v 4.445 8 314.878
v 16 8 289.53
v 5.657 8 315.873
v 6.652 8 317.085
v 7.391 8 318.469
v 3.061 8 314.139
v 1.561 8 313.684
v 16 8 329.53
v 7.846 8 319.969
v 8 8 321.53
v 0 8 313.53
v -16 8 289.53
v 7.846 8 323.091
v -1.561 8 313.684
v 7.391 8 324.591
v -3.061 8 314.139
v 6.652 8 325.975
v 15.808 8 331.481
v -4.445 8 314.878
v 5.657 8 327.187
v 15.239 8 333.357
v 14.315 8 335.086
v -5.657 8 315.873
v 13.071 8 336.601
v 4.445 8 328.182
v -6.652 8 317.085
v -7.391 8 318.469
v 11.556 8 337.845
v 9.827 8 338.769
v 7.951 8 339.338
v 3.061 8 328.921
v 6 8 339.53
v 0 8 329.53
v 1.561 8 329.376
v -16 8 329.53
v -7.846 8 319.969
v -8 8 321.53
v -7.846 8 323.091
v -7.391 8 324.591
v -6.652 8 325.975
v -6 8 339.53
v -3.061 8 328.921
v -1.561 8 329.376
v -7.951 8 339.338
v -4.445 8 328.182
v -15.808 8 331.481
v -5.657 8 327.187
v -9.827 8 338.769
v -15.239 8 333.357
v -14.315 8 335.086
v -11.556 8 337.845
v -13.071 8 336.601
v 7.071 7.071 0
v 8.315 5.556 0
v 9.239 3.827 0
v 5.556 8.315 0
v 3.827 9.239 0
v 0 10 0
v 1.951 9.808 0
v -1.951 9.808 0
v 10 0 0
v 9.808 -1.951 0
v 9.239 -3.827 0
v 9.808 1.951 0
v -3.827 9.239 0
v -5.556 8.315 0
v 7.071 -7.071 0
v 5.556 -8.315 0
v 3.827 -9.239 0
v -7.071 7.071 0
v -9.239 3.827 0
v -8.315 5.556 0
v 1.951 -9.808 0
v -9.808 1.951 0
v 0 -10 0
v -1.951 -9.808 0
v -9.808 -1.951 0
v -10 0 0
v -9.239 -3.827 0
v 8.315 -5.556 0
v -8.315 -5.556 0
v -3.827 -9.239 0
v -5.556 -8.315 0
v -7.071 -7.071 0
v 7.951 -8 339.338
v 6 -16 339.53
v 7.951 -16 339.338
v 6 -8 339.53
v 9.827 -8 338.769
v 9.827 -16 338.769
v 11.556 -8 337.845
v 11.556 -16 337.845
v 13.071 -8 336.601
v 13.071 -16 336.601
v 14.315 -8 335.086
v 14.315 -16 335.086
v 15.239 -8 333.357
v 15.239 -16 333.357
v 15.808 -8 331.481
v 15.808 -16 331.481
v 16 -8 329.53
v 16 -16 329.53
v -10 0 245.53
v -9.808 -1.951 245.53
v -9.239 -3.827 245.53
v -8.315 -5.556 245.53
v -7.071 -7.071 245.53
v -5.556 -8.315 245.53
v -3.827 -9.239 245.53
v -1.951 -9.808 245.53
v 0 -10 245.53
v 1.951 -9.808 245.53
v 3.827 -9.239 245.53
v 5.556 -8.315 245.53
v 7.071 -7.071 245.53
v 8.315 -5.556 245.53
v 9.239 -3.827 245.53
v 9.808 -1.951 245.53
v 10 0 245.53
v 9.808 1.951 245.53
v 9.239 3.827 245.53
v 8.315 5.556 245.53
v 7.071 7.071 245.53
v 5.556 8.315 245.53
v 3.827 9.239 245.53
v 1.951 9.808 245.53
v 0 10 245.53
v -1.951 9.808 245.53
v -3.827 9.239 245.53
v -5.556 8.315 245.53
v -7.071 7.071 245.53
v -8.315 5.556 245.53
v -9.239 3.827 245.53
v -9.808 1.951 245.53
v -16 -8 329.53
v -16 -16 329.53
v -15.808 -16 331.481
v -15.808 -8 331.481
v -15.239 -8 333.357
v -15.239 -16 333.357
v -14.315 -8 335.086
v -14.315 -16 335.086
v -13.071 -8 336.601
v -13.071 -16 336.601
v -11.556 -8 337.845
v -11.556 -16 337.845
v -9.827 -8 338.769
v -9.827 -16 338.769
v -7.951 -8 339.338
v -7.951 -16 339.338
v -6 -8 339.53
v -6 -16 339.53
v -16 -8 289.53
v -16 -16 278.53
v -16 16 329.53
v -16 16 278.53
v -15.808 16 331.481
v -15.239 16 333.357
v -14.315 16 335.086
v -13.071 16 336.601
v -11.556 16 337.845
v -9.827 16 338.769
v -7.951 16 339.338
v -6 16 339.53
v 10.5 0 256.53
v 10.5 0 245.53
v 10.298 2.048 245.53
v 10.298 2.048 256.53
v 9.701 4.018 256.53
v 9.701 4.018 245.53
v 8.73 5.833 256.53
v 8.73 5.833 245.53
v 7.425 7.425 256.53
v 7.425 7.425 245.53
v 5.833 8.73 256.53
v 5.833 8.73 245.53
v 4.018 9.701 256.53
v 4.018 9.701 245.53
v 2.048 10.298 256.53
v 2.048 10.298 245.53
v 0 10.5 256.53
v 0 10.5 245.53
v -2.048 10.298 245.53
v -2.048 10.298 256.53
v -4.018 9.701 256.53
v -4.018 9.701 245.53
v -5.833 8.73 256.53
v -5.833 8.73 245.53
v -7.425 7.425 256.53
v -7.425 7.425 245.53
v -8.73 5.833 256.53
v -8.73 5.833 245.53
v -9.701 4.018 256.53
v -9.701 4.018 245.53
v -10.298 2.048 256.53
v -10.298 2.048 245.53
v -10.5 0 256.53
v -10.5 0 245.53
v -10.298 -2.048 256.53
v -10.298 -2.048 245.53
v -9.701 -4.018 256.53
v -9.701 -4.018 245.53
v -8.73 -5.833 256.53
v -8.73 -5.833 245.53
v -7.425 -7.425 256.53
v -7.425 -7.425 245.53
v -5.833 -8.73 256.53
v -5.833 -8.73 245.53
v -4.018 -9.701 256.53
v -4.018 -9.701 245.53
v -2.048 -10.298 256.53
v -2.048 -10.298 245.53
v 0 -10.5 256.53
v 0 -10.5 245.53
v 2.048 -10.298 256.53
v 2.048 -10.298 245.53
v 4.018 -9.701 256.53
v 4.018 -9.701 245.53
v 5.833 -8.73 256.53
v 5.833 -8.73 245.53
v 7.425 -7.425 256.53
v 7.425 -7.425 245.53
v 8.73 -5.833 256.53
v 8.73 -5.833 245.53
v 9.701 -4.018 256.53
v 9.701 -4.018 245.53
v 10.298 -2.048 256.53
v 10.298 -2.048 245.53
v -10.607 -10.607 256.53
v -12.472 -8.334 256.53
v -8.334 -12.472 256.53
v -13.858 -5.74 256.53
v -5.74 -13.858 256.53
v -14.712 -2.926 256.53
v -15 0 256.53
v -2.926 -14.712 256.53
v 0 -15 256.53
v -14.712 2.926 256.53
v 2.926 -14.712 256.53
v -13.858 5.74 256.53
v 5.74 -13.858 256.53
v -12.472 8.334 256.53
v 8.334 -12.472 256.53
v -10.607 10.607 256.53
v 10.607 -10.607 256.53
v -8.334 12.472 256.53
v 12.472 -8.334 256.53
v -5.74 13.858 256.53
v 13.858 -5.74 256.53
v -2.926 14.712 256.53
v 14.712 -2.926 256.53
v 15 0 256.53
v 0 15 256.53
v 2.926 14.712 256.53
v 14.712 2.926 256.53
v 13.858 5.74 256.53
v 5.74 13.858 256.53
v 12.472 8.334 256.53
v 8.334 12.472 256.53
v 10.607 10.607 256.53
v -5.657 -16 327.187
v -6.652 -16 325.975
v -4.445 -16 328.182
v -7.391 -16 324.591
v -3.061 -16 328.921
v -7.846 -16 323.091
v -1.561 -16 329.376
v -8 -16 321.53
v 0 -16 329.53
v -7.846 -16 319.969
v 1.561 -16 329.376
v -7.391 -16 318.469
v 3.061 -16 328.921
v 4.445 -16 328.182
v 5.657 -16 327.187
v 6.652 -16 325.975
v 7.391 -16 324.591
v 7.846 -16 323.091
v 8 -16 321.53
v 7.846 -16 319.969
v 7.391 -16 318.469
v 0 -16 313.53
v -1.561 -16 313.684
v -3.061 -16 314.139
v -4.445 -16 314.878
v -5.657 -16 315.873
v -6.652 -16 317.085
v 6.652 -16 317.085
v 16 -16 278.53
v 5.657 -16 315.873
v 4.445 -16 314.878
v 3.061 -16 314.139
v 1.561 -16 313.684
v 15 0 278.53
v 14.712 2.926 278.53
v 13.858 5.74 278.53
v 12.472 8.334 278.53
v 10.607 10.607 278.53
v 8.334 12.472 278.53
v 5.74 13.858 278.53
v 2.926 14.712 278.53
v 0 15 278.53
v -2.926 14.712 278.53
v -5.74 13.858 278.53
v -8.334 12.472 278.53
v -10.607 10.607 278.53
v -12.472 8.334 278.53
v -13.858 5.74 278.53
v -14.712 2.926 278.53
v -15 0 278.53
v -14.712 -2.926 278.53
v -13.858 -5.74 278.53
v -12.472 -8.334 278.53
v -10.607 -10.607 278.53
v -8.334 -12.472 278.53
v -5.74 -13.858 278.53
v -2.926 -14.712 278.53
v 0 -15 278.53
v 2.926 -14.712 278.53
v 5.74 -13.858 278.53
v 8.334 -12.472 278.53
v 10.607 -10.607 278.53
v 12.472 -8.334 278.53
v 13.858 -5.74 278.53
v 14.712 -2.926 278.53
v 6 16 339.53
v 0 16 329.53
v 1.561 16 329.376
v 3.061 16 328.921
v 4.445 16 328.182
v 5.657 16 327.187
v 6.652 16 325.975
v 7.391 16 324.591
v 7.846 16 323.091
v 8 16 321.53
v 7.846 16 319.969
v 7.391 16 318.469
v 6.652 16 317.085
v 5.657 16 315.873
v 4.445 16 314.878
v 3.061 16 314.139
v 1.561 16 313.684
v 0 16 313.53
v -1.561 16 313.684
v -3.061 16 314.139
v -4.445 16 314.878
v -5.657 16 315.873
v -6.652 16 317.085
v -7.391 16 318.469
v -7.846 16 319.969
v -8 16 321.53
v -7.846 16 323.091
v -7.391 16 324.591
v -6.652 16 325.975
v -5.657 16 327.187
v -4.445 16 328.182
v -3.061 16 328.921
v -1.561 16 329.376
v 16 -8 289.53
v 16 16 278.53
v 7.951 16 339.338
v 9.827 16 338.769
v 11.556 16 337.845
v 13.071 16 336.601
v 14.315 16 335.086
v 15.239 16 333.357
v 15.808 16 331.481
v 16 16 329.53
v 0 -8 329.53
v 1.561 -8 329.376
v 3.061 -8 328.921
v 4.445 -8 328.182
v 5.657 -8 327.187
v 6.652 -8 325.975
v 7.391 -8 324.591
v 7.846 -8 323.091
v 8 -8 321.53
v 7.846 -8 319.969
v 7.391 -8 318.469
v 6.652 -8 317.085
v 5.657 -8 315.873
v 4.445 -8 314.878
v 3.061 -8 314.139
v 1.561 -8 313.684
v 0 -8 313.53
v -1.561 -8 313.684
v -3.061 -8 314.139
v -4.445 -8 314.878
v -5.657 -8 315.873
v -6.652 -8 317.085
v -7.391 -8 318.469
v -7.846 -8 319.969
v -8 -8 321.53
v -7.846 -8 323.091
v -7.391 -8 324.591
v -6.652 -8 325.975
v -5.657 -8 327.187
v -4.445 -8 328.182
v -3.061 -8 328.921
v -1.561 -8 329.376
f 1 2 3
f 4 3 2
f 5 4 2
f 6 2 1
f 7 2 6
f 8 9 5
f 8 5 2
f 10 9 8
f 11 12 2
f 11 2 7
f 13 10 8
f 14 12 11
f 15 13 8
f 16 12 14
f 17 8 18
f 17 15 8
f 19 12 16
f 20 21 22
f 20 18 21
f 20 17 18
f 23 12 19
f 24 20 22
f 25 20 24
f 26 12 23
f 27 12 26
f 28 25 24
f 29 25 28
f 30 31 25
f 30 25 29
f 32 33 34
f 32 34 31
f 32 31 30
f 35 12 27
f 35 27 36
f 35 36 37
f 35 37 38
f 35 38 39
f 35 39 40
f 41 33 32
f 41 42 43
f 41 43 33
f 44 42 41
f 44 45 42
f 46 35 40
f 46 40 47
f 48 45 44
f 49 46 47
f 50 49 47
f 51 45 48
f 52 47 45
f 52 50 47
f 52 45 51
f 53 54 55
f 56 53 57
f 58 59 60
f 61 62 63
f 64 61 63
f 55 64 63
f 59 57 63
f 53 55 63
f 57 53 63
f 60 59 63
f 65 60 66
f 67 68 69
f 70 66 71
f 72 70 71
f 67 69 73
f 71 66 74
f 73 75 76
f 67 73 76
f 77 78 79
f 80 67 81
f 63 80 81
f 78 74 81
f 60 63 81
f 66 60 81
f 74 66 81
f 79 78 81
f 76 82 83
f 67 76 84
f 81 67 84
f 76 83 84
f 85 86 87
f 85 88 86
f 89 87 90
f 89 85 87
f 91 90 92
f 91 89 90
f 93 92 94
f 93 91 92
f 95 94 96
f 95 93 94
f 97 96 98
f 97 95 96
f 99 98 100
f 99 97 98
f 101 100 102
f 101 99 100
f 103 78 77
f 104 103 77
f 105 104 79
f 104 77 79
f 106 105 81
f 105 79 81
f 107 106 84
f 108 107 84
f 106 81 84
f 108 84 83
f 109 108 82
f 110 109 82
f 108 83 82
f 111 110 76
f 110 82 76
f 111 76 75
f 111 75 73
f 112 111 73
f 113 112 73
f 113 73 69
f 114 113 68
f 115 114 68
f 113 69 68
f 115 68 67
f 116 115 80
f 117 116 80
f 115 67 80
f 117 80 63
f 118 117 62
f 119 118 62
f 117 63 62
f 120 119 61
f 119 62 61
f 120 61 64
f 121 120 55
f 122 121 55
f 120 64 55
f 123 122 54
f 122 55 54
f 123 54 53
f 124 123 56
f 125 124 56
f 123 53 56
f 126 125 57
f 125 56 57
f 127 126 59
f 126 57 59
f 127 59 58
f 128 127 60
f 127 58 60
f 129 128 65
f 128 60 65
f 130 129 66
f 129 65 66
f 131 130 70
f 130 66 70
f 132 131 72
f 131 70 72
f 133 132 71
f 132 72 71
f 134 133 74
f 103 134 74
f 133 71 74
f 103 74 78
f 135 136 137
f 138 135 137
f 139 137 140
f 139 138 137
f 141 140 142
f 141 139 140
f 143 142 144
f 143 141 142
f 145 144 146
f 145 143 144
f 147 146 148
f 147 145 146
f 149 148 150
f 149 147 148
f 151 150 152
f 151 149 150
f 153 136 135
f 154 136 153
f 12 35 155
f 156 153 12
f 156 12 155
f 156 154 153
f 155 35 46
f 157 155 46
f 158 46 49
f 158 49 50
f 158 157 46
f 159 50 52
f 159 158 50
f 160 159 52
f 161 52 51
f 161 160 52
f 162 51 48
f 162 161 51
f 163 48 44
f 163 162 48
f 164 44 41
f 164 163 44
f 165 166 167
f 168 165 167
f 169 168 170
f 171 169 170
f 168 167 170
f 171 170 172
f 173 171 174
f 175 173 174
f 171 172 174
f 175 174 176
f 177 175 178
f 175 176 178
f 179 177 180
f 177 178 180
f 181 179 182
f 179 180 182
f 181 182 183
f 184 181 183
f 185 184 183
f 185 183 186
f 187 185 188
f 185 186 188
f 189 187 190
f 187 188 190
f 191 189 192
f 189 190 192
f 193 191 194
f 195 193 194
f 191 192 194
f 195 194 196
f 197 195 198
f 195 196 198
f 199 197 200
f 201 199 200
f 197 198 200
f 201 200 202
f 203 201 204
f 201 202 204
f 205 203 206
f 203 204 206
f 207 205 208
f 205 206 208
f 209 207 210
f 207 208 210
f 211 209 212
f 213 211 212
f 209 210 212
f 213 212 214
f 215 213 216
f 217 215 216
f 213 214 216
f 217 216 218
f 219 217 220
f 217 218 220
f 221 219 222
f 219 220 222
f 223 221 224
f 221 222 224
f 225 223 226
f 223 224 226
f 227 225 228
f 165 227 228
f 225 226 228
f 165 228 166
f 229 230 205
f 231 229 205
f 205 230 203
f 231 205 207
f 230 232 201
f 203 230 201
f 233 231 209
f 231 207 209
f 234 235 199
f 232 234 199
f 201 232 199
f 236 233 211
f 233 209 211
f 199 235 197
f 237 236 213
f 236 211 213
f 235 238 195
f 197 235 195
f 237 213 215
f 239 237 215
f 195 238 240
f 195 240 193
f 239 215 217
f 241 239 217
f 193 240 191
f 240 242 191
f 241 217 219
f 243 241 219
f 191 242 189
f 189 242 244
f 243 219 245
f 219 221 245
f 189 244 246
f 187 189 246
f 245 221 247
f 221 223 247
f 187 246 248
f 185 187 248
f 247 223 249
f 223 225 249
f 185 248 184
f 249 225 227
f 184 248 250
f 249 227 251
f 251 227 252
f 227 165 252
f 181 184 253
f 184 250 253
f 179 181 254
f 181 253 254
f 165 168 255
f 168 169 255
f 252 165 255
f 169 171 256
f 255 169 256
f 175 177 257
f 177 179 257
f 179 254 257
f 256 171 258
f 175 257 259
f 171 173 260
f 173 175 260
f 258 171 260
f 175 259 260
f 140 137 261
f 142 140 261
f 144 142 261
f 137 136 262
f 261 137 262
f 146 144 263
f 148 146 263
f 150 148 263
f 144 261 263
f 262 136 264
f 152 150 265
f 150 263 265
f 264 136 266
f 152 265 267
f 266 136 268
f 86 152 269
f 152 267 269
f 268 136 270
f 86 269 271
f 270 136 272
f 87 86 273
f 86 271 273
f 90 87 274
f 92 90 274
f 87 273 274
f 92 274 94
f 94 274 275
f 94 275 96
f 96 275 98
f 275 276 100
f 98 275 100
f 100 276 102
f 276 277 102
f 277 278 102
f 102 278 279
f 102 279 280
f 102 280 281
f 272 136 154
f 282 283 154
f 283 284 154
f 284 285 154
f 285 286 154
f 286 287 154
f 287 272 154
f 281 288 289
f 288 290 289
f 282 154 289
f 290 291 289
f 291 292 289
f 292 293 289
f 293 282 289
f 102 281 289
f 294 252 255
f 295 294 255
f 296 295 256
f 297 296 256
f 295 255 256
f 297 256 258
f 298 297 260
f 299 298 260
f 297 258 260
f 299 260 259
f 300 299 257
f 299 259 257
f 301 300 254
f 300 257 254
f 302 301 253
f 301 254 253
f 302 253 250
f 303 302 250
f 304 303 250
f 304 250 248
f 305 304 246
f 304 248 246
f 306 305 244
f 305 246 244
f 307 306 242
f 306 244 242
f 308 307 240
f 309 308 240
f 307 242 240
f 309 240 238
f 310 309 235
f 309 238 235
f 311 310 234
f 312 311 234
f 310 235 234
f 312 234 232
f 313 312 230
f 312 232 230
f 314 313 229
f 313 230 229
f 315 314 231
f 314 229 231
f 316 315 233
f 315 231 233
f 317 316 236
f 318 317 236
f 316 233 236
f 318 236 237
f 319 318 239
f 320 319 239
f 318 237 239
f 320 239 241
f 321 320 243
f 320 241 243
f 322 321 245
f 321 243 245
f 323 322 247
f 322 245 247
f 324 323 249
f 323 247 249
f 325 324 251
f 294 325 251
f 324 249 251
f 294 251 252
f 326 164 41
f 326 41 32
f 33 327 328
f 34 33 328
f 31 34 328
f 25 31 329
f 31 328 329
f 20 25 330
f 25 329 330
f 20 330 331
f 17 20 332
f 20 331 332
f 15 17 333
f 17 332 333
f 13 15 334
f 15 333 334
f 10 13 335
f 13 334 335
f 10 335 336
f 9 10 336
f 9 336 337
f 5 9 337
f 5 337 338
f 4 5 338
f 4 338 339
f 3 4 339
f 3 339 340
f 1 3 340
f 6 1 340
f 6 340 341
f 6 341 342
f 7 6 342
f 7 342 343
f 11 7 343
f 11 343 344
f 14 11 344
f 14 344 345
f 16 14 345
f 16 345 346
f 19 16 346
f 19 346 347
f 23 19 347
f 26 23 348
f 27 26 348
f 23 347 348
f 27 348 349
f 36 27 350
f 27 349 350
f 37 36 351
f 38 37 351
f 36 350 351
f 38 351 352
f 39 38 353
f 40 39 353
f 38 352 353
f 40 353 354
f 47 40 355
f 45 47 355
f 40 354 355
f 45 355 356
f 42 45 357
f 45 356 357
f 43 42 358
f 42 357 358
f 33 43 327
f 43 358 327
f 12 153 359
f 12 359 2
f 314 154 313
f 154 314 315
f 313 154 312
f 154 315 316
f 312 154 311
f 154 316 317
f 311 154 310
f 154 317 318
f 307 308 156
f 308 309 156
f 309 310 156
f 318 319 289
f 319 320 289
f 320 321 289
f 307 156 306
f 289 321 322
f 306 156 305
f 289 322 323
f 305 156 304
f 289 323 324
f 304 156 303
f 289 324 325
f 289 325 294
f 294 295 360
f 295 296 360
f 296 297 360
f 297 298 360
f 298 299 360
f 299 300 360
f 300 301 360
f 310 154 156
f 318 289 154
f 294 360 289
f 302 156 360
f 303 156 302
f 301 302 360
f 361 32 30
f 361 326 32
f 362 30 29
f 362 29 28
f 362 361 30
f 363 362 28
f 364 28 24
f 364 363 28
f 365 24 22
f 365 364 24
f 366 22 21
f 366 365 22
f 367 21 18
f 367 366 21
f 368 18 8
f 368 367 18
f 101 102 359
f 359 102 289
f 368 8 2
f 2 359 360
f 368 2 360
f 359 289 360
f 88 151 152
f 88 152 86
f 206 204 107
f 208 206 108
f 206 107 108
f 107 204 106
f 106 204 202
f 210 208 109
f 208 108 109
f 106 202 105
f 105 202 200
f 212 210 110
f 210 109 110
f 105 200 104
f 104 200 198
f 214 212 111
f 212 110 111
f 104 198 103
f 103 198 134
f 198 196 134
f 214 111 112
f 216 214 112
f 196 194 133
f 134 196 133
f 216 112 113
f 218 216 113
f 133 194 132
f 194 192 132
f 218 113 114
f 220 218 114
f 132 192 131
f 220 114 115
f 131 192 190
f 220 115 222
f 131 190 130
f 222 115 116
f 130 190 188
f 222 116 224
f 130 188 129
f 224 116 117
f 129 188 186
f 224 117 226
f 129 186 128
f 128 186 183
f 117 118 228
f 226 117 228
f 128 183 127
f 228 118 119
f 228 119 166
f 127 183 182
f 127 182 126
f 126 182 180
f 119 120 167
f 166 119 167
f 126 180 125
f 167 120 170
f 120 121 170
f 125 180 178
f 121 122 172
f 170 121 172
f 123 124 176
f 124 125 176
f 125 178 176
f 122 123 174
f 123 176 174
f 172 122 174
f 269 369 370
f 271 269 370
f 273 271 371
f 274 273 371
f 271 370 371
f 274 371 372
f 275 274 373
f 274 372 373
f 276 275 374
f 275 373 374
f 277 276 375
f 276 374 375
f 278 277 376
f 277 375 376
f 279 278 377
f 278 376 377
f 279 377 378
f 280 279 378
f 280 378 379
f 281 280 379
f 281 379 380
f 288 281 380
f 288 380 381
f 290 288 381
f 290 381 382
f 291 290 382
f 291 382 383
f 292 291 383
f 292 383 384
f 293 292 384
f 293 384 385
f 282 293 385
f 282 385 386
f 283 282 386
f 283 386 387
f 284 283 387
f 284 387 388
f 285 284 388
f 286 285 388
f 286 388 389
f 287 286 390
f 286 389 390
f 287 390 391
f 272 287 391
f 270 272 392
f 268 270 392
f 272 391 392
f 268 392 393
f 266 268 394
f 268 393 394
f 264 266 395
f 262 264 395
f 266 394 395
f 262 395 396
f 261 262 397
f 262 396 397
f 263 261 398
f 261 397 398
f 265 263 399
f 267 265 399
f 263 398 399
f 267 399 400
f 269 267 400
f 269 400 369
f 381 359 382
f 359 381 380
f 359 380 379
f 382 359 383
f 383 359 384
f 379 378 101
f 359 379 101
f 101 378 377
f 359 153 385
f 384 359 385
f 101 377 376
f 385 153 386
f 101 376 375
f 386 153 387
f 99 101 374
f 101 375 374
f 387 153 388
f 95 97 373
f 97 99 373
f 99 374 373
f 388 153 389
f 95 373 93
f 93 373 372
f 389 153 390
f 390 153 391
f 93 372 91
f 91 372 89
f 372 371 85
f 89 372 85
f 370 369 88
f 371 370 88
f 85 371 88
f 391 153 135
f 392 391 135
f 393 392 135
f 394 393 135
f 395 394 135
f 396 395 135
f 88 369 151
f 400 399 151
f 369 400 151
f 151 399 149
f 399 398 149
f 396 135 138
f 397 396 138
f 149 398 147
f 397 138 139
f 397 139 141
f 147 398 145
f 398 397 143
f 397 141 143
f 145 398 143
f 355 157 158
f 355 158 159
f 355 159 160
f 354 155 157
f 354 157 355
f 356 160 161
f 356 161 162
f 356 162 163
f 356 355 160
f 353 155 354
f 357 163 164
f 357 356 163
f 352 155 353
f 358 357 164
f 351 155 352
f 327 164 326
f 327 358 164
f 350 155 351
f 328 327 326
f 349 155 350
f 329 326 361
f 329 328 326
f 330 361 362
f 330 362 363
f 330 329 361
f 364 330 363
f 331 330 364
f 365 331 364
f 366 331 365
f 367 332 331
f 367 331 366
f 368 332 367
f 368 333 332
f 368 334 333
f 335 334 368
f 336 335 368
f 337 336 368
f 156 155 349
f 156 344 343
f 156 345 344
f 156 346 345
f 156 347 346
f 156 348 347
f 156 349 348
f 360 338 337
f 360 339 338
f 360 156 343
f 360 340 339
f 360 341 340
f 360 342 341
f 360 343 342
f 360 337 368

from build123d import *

# Parameters (mm, degrees)
SKETCH1_R           = 10
BOSS_EXTRUDE1_DEPTH = 245.53
SKETCH2_R           = 10.5
BOSS_EXTRUDE2_DEPTH = 11
SKETCH3_R           = 15
BOSS_EXTRUDE3_DEPTH = 22
SKETCH4_W           = 32
SKETCH4_H           = 32
BOSS_EXTRUDE4_DEPTH = 61
SKETCH5_W           = 50
SKETCH5_H           = 16
CUT_EXTRUDE1_DEPTH  = 58
SKETCH6_R           = 8
CUT_EXTRUDE2_DEPTH  = 58
FILLET1_R           = 10


with BuildPart() as part:
    # Sketch1 → Boss-Extrude1 (new body)
    with BuildSketch(Plane.XY):
        with Locations(Location((0, 0, 0), (0, 0, 180))):
            Circle(SKETCH1_R)
    extrude(amount=BOSS_EXTRUDE1_DEPTH)

    # Sketch2 → Boss-Extrude2 (add)
    with BuildSketch(Plane.XY.offset(245.53)):
        Circle(SKETCH2_R)
    extrude(amount=BOSS_EXTRUDE2_DEPTH)

    # Sketch3 → Boss-Extrude3 (add)
    with BuildSketch(Plane.XY.offset(256.53)):
        Circle(SKETCH3_R)
    extrude(amount=BOSS_EXTRUDE3_DEPTH)

    # Sketch4 → Boss-Extrude4 (add)
    with BuildSketch(Plane.XY.offset(278.53)):
        Rectangle(SKETCH4_W, SKETCH4_H)
    extrude(amount=BOSS_EXTRUDE4_DEPTH)

    # Sketch5 → Cut-Extrude1 (cut)
    with BuildSketch(Plane.ZY.offset(16)):
        with Locations((314.53, 0)):
            Rectangle(SKETCH5_W, SKETCH5_H)
    extrude(amount=-CUT_EXTRUDE1_DEPTH, mode=Mode.SUBTRACT)

    # Sketch6 → Cut-Extrude2 (cut)
    with BuildSketch(Plane(origin=(0, 16, 0), x_dir=(1, 0, 0), z_dir=(0, 1, 0))):
        with Locations(Location((0, -321.53, 0), (0, 0, 270))):
            Circle(SKETCH6_R)
    extrude(amount=-CUT_EXTRUDE2_DEPTH, mode=Mode.SUBTRACT)

    # Fillet1
    fillet1_edges = [part.edges().sort_by_distance(p)[0] for p in [
        (16, -12, 339.53),
        (-16, 12, 339.53),
        (16, 12, 339.53),
        (-16, -12, 339.53),
    ]]
    fillet(fillet1_edges, radius=FILLET1_R)


solid = part.part
